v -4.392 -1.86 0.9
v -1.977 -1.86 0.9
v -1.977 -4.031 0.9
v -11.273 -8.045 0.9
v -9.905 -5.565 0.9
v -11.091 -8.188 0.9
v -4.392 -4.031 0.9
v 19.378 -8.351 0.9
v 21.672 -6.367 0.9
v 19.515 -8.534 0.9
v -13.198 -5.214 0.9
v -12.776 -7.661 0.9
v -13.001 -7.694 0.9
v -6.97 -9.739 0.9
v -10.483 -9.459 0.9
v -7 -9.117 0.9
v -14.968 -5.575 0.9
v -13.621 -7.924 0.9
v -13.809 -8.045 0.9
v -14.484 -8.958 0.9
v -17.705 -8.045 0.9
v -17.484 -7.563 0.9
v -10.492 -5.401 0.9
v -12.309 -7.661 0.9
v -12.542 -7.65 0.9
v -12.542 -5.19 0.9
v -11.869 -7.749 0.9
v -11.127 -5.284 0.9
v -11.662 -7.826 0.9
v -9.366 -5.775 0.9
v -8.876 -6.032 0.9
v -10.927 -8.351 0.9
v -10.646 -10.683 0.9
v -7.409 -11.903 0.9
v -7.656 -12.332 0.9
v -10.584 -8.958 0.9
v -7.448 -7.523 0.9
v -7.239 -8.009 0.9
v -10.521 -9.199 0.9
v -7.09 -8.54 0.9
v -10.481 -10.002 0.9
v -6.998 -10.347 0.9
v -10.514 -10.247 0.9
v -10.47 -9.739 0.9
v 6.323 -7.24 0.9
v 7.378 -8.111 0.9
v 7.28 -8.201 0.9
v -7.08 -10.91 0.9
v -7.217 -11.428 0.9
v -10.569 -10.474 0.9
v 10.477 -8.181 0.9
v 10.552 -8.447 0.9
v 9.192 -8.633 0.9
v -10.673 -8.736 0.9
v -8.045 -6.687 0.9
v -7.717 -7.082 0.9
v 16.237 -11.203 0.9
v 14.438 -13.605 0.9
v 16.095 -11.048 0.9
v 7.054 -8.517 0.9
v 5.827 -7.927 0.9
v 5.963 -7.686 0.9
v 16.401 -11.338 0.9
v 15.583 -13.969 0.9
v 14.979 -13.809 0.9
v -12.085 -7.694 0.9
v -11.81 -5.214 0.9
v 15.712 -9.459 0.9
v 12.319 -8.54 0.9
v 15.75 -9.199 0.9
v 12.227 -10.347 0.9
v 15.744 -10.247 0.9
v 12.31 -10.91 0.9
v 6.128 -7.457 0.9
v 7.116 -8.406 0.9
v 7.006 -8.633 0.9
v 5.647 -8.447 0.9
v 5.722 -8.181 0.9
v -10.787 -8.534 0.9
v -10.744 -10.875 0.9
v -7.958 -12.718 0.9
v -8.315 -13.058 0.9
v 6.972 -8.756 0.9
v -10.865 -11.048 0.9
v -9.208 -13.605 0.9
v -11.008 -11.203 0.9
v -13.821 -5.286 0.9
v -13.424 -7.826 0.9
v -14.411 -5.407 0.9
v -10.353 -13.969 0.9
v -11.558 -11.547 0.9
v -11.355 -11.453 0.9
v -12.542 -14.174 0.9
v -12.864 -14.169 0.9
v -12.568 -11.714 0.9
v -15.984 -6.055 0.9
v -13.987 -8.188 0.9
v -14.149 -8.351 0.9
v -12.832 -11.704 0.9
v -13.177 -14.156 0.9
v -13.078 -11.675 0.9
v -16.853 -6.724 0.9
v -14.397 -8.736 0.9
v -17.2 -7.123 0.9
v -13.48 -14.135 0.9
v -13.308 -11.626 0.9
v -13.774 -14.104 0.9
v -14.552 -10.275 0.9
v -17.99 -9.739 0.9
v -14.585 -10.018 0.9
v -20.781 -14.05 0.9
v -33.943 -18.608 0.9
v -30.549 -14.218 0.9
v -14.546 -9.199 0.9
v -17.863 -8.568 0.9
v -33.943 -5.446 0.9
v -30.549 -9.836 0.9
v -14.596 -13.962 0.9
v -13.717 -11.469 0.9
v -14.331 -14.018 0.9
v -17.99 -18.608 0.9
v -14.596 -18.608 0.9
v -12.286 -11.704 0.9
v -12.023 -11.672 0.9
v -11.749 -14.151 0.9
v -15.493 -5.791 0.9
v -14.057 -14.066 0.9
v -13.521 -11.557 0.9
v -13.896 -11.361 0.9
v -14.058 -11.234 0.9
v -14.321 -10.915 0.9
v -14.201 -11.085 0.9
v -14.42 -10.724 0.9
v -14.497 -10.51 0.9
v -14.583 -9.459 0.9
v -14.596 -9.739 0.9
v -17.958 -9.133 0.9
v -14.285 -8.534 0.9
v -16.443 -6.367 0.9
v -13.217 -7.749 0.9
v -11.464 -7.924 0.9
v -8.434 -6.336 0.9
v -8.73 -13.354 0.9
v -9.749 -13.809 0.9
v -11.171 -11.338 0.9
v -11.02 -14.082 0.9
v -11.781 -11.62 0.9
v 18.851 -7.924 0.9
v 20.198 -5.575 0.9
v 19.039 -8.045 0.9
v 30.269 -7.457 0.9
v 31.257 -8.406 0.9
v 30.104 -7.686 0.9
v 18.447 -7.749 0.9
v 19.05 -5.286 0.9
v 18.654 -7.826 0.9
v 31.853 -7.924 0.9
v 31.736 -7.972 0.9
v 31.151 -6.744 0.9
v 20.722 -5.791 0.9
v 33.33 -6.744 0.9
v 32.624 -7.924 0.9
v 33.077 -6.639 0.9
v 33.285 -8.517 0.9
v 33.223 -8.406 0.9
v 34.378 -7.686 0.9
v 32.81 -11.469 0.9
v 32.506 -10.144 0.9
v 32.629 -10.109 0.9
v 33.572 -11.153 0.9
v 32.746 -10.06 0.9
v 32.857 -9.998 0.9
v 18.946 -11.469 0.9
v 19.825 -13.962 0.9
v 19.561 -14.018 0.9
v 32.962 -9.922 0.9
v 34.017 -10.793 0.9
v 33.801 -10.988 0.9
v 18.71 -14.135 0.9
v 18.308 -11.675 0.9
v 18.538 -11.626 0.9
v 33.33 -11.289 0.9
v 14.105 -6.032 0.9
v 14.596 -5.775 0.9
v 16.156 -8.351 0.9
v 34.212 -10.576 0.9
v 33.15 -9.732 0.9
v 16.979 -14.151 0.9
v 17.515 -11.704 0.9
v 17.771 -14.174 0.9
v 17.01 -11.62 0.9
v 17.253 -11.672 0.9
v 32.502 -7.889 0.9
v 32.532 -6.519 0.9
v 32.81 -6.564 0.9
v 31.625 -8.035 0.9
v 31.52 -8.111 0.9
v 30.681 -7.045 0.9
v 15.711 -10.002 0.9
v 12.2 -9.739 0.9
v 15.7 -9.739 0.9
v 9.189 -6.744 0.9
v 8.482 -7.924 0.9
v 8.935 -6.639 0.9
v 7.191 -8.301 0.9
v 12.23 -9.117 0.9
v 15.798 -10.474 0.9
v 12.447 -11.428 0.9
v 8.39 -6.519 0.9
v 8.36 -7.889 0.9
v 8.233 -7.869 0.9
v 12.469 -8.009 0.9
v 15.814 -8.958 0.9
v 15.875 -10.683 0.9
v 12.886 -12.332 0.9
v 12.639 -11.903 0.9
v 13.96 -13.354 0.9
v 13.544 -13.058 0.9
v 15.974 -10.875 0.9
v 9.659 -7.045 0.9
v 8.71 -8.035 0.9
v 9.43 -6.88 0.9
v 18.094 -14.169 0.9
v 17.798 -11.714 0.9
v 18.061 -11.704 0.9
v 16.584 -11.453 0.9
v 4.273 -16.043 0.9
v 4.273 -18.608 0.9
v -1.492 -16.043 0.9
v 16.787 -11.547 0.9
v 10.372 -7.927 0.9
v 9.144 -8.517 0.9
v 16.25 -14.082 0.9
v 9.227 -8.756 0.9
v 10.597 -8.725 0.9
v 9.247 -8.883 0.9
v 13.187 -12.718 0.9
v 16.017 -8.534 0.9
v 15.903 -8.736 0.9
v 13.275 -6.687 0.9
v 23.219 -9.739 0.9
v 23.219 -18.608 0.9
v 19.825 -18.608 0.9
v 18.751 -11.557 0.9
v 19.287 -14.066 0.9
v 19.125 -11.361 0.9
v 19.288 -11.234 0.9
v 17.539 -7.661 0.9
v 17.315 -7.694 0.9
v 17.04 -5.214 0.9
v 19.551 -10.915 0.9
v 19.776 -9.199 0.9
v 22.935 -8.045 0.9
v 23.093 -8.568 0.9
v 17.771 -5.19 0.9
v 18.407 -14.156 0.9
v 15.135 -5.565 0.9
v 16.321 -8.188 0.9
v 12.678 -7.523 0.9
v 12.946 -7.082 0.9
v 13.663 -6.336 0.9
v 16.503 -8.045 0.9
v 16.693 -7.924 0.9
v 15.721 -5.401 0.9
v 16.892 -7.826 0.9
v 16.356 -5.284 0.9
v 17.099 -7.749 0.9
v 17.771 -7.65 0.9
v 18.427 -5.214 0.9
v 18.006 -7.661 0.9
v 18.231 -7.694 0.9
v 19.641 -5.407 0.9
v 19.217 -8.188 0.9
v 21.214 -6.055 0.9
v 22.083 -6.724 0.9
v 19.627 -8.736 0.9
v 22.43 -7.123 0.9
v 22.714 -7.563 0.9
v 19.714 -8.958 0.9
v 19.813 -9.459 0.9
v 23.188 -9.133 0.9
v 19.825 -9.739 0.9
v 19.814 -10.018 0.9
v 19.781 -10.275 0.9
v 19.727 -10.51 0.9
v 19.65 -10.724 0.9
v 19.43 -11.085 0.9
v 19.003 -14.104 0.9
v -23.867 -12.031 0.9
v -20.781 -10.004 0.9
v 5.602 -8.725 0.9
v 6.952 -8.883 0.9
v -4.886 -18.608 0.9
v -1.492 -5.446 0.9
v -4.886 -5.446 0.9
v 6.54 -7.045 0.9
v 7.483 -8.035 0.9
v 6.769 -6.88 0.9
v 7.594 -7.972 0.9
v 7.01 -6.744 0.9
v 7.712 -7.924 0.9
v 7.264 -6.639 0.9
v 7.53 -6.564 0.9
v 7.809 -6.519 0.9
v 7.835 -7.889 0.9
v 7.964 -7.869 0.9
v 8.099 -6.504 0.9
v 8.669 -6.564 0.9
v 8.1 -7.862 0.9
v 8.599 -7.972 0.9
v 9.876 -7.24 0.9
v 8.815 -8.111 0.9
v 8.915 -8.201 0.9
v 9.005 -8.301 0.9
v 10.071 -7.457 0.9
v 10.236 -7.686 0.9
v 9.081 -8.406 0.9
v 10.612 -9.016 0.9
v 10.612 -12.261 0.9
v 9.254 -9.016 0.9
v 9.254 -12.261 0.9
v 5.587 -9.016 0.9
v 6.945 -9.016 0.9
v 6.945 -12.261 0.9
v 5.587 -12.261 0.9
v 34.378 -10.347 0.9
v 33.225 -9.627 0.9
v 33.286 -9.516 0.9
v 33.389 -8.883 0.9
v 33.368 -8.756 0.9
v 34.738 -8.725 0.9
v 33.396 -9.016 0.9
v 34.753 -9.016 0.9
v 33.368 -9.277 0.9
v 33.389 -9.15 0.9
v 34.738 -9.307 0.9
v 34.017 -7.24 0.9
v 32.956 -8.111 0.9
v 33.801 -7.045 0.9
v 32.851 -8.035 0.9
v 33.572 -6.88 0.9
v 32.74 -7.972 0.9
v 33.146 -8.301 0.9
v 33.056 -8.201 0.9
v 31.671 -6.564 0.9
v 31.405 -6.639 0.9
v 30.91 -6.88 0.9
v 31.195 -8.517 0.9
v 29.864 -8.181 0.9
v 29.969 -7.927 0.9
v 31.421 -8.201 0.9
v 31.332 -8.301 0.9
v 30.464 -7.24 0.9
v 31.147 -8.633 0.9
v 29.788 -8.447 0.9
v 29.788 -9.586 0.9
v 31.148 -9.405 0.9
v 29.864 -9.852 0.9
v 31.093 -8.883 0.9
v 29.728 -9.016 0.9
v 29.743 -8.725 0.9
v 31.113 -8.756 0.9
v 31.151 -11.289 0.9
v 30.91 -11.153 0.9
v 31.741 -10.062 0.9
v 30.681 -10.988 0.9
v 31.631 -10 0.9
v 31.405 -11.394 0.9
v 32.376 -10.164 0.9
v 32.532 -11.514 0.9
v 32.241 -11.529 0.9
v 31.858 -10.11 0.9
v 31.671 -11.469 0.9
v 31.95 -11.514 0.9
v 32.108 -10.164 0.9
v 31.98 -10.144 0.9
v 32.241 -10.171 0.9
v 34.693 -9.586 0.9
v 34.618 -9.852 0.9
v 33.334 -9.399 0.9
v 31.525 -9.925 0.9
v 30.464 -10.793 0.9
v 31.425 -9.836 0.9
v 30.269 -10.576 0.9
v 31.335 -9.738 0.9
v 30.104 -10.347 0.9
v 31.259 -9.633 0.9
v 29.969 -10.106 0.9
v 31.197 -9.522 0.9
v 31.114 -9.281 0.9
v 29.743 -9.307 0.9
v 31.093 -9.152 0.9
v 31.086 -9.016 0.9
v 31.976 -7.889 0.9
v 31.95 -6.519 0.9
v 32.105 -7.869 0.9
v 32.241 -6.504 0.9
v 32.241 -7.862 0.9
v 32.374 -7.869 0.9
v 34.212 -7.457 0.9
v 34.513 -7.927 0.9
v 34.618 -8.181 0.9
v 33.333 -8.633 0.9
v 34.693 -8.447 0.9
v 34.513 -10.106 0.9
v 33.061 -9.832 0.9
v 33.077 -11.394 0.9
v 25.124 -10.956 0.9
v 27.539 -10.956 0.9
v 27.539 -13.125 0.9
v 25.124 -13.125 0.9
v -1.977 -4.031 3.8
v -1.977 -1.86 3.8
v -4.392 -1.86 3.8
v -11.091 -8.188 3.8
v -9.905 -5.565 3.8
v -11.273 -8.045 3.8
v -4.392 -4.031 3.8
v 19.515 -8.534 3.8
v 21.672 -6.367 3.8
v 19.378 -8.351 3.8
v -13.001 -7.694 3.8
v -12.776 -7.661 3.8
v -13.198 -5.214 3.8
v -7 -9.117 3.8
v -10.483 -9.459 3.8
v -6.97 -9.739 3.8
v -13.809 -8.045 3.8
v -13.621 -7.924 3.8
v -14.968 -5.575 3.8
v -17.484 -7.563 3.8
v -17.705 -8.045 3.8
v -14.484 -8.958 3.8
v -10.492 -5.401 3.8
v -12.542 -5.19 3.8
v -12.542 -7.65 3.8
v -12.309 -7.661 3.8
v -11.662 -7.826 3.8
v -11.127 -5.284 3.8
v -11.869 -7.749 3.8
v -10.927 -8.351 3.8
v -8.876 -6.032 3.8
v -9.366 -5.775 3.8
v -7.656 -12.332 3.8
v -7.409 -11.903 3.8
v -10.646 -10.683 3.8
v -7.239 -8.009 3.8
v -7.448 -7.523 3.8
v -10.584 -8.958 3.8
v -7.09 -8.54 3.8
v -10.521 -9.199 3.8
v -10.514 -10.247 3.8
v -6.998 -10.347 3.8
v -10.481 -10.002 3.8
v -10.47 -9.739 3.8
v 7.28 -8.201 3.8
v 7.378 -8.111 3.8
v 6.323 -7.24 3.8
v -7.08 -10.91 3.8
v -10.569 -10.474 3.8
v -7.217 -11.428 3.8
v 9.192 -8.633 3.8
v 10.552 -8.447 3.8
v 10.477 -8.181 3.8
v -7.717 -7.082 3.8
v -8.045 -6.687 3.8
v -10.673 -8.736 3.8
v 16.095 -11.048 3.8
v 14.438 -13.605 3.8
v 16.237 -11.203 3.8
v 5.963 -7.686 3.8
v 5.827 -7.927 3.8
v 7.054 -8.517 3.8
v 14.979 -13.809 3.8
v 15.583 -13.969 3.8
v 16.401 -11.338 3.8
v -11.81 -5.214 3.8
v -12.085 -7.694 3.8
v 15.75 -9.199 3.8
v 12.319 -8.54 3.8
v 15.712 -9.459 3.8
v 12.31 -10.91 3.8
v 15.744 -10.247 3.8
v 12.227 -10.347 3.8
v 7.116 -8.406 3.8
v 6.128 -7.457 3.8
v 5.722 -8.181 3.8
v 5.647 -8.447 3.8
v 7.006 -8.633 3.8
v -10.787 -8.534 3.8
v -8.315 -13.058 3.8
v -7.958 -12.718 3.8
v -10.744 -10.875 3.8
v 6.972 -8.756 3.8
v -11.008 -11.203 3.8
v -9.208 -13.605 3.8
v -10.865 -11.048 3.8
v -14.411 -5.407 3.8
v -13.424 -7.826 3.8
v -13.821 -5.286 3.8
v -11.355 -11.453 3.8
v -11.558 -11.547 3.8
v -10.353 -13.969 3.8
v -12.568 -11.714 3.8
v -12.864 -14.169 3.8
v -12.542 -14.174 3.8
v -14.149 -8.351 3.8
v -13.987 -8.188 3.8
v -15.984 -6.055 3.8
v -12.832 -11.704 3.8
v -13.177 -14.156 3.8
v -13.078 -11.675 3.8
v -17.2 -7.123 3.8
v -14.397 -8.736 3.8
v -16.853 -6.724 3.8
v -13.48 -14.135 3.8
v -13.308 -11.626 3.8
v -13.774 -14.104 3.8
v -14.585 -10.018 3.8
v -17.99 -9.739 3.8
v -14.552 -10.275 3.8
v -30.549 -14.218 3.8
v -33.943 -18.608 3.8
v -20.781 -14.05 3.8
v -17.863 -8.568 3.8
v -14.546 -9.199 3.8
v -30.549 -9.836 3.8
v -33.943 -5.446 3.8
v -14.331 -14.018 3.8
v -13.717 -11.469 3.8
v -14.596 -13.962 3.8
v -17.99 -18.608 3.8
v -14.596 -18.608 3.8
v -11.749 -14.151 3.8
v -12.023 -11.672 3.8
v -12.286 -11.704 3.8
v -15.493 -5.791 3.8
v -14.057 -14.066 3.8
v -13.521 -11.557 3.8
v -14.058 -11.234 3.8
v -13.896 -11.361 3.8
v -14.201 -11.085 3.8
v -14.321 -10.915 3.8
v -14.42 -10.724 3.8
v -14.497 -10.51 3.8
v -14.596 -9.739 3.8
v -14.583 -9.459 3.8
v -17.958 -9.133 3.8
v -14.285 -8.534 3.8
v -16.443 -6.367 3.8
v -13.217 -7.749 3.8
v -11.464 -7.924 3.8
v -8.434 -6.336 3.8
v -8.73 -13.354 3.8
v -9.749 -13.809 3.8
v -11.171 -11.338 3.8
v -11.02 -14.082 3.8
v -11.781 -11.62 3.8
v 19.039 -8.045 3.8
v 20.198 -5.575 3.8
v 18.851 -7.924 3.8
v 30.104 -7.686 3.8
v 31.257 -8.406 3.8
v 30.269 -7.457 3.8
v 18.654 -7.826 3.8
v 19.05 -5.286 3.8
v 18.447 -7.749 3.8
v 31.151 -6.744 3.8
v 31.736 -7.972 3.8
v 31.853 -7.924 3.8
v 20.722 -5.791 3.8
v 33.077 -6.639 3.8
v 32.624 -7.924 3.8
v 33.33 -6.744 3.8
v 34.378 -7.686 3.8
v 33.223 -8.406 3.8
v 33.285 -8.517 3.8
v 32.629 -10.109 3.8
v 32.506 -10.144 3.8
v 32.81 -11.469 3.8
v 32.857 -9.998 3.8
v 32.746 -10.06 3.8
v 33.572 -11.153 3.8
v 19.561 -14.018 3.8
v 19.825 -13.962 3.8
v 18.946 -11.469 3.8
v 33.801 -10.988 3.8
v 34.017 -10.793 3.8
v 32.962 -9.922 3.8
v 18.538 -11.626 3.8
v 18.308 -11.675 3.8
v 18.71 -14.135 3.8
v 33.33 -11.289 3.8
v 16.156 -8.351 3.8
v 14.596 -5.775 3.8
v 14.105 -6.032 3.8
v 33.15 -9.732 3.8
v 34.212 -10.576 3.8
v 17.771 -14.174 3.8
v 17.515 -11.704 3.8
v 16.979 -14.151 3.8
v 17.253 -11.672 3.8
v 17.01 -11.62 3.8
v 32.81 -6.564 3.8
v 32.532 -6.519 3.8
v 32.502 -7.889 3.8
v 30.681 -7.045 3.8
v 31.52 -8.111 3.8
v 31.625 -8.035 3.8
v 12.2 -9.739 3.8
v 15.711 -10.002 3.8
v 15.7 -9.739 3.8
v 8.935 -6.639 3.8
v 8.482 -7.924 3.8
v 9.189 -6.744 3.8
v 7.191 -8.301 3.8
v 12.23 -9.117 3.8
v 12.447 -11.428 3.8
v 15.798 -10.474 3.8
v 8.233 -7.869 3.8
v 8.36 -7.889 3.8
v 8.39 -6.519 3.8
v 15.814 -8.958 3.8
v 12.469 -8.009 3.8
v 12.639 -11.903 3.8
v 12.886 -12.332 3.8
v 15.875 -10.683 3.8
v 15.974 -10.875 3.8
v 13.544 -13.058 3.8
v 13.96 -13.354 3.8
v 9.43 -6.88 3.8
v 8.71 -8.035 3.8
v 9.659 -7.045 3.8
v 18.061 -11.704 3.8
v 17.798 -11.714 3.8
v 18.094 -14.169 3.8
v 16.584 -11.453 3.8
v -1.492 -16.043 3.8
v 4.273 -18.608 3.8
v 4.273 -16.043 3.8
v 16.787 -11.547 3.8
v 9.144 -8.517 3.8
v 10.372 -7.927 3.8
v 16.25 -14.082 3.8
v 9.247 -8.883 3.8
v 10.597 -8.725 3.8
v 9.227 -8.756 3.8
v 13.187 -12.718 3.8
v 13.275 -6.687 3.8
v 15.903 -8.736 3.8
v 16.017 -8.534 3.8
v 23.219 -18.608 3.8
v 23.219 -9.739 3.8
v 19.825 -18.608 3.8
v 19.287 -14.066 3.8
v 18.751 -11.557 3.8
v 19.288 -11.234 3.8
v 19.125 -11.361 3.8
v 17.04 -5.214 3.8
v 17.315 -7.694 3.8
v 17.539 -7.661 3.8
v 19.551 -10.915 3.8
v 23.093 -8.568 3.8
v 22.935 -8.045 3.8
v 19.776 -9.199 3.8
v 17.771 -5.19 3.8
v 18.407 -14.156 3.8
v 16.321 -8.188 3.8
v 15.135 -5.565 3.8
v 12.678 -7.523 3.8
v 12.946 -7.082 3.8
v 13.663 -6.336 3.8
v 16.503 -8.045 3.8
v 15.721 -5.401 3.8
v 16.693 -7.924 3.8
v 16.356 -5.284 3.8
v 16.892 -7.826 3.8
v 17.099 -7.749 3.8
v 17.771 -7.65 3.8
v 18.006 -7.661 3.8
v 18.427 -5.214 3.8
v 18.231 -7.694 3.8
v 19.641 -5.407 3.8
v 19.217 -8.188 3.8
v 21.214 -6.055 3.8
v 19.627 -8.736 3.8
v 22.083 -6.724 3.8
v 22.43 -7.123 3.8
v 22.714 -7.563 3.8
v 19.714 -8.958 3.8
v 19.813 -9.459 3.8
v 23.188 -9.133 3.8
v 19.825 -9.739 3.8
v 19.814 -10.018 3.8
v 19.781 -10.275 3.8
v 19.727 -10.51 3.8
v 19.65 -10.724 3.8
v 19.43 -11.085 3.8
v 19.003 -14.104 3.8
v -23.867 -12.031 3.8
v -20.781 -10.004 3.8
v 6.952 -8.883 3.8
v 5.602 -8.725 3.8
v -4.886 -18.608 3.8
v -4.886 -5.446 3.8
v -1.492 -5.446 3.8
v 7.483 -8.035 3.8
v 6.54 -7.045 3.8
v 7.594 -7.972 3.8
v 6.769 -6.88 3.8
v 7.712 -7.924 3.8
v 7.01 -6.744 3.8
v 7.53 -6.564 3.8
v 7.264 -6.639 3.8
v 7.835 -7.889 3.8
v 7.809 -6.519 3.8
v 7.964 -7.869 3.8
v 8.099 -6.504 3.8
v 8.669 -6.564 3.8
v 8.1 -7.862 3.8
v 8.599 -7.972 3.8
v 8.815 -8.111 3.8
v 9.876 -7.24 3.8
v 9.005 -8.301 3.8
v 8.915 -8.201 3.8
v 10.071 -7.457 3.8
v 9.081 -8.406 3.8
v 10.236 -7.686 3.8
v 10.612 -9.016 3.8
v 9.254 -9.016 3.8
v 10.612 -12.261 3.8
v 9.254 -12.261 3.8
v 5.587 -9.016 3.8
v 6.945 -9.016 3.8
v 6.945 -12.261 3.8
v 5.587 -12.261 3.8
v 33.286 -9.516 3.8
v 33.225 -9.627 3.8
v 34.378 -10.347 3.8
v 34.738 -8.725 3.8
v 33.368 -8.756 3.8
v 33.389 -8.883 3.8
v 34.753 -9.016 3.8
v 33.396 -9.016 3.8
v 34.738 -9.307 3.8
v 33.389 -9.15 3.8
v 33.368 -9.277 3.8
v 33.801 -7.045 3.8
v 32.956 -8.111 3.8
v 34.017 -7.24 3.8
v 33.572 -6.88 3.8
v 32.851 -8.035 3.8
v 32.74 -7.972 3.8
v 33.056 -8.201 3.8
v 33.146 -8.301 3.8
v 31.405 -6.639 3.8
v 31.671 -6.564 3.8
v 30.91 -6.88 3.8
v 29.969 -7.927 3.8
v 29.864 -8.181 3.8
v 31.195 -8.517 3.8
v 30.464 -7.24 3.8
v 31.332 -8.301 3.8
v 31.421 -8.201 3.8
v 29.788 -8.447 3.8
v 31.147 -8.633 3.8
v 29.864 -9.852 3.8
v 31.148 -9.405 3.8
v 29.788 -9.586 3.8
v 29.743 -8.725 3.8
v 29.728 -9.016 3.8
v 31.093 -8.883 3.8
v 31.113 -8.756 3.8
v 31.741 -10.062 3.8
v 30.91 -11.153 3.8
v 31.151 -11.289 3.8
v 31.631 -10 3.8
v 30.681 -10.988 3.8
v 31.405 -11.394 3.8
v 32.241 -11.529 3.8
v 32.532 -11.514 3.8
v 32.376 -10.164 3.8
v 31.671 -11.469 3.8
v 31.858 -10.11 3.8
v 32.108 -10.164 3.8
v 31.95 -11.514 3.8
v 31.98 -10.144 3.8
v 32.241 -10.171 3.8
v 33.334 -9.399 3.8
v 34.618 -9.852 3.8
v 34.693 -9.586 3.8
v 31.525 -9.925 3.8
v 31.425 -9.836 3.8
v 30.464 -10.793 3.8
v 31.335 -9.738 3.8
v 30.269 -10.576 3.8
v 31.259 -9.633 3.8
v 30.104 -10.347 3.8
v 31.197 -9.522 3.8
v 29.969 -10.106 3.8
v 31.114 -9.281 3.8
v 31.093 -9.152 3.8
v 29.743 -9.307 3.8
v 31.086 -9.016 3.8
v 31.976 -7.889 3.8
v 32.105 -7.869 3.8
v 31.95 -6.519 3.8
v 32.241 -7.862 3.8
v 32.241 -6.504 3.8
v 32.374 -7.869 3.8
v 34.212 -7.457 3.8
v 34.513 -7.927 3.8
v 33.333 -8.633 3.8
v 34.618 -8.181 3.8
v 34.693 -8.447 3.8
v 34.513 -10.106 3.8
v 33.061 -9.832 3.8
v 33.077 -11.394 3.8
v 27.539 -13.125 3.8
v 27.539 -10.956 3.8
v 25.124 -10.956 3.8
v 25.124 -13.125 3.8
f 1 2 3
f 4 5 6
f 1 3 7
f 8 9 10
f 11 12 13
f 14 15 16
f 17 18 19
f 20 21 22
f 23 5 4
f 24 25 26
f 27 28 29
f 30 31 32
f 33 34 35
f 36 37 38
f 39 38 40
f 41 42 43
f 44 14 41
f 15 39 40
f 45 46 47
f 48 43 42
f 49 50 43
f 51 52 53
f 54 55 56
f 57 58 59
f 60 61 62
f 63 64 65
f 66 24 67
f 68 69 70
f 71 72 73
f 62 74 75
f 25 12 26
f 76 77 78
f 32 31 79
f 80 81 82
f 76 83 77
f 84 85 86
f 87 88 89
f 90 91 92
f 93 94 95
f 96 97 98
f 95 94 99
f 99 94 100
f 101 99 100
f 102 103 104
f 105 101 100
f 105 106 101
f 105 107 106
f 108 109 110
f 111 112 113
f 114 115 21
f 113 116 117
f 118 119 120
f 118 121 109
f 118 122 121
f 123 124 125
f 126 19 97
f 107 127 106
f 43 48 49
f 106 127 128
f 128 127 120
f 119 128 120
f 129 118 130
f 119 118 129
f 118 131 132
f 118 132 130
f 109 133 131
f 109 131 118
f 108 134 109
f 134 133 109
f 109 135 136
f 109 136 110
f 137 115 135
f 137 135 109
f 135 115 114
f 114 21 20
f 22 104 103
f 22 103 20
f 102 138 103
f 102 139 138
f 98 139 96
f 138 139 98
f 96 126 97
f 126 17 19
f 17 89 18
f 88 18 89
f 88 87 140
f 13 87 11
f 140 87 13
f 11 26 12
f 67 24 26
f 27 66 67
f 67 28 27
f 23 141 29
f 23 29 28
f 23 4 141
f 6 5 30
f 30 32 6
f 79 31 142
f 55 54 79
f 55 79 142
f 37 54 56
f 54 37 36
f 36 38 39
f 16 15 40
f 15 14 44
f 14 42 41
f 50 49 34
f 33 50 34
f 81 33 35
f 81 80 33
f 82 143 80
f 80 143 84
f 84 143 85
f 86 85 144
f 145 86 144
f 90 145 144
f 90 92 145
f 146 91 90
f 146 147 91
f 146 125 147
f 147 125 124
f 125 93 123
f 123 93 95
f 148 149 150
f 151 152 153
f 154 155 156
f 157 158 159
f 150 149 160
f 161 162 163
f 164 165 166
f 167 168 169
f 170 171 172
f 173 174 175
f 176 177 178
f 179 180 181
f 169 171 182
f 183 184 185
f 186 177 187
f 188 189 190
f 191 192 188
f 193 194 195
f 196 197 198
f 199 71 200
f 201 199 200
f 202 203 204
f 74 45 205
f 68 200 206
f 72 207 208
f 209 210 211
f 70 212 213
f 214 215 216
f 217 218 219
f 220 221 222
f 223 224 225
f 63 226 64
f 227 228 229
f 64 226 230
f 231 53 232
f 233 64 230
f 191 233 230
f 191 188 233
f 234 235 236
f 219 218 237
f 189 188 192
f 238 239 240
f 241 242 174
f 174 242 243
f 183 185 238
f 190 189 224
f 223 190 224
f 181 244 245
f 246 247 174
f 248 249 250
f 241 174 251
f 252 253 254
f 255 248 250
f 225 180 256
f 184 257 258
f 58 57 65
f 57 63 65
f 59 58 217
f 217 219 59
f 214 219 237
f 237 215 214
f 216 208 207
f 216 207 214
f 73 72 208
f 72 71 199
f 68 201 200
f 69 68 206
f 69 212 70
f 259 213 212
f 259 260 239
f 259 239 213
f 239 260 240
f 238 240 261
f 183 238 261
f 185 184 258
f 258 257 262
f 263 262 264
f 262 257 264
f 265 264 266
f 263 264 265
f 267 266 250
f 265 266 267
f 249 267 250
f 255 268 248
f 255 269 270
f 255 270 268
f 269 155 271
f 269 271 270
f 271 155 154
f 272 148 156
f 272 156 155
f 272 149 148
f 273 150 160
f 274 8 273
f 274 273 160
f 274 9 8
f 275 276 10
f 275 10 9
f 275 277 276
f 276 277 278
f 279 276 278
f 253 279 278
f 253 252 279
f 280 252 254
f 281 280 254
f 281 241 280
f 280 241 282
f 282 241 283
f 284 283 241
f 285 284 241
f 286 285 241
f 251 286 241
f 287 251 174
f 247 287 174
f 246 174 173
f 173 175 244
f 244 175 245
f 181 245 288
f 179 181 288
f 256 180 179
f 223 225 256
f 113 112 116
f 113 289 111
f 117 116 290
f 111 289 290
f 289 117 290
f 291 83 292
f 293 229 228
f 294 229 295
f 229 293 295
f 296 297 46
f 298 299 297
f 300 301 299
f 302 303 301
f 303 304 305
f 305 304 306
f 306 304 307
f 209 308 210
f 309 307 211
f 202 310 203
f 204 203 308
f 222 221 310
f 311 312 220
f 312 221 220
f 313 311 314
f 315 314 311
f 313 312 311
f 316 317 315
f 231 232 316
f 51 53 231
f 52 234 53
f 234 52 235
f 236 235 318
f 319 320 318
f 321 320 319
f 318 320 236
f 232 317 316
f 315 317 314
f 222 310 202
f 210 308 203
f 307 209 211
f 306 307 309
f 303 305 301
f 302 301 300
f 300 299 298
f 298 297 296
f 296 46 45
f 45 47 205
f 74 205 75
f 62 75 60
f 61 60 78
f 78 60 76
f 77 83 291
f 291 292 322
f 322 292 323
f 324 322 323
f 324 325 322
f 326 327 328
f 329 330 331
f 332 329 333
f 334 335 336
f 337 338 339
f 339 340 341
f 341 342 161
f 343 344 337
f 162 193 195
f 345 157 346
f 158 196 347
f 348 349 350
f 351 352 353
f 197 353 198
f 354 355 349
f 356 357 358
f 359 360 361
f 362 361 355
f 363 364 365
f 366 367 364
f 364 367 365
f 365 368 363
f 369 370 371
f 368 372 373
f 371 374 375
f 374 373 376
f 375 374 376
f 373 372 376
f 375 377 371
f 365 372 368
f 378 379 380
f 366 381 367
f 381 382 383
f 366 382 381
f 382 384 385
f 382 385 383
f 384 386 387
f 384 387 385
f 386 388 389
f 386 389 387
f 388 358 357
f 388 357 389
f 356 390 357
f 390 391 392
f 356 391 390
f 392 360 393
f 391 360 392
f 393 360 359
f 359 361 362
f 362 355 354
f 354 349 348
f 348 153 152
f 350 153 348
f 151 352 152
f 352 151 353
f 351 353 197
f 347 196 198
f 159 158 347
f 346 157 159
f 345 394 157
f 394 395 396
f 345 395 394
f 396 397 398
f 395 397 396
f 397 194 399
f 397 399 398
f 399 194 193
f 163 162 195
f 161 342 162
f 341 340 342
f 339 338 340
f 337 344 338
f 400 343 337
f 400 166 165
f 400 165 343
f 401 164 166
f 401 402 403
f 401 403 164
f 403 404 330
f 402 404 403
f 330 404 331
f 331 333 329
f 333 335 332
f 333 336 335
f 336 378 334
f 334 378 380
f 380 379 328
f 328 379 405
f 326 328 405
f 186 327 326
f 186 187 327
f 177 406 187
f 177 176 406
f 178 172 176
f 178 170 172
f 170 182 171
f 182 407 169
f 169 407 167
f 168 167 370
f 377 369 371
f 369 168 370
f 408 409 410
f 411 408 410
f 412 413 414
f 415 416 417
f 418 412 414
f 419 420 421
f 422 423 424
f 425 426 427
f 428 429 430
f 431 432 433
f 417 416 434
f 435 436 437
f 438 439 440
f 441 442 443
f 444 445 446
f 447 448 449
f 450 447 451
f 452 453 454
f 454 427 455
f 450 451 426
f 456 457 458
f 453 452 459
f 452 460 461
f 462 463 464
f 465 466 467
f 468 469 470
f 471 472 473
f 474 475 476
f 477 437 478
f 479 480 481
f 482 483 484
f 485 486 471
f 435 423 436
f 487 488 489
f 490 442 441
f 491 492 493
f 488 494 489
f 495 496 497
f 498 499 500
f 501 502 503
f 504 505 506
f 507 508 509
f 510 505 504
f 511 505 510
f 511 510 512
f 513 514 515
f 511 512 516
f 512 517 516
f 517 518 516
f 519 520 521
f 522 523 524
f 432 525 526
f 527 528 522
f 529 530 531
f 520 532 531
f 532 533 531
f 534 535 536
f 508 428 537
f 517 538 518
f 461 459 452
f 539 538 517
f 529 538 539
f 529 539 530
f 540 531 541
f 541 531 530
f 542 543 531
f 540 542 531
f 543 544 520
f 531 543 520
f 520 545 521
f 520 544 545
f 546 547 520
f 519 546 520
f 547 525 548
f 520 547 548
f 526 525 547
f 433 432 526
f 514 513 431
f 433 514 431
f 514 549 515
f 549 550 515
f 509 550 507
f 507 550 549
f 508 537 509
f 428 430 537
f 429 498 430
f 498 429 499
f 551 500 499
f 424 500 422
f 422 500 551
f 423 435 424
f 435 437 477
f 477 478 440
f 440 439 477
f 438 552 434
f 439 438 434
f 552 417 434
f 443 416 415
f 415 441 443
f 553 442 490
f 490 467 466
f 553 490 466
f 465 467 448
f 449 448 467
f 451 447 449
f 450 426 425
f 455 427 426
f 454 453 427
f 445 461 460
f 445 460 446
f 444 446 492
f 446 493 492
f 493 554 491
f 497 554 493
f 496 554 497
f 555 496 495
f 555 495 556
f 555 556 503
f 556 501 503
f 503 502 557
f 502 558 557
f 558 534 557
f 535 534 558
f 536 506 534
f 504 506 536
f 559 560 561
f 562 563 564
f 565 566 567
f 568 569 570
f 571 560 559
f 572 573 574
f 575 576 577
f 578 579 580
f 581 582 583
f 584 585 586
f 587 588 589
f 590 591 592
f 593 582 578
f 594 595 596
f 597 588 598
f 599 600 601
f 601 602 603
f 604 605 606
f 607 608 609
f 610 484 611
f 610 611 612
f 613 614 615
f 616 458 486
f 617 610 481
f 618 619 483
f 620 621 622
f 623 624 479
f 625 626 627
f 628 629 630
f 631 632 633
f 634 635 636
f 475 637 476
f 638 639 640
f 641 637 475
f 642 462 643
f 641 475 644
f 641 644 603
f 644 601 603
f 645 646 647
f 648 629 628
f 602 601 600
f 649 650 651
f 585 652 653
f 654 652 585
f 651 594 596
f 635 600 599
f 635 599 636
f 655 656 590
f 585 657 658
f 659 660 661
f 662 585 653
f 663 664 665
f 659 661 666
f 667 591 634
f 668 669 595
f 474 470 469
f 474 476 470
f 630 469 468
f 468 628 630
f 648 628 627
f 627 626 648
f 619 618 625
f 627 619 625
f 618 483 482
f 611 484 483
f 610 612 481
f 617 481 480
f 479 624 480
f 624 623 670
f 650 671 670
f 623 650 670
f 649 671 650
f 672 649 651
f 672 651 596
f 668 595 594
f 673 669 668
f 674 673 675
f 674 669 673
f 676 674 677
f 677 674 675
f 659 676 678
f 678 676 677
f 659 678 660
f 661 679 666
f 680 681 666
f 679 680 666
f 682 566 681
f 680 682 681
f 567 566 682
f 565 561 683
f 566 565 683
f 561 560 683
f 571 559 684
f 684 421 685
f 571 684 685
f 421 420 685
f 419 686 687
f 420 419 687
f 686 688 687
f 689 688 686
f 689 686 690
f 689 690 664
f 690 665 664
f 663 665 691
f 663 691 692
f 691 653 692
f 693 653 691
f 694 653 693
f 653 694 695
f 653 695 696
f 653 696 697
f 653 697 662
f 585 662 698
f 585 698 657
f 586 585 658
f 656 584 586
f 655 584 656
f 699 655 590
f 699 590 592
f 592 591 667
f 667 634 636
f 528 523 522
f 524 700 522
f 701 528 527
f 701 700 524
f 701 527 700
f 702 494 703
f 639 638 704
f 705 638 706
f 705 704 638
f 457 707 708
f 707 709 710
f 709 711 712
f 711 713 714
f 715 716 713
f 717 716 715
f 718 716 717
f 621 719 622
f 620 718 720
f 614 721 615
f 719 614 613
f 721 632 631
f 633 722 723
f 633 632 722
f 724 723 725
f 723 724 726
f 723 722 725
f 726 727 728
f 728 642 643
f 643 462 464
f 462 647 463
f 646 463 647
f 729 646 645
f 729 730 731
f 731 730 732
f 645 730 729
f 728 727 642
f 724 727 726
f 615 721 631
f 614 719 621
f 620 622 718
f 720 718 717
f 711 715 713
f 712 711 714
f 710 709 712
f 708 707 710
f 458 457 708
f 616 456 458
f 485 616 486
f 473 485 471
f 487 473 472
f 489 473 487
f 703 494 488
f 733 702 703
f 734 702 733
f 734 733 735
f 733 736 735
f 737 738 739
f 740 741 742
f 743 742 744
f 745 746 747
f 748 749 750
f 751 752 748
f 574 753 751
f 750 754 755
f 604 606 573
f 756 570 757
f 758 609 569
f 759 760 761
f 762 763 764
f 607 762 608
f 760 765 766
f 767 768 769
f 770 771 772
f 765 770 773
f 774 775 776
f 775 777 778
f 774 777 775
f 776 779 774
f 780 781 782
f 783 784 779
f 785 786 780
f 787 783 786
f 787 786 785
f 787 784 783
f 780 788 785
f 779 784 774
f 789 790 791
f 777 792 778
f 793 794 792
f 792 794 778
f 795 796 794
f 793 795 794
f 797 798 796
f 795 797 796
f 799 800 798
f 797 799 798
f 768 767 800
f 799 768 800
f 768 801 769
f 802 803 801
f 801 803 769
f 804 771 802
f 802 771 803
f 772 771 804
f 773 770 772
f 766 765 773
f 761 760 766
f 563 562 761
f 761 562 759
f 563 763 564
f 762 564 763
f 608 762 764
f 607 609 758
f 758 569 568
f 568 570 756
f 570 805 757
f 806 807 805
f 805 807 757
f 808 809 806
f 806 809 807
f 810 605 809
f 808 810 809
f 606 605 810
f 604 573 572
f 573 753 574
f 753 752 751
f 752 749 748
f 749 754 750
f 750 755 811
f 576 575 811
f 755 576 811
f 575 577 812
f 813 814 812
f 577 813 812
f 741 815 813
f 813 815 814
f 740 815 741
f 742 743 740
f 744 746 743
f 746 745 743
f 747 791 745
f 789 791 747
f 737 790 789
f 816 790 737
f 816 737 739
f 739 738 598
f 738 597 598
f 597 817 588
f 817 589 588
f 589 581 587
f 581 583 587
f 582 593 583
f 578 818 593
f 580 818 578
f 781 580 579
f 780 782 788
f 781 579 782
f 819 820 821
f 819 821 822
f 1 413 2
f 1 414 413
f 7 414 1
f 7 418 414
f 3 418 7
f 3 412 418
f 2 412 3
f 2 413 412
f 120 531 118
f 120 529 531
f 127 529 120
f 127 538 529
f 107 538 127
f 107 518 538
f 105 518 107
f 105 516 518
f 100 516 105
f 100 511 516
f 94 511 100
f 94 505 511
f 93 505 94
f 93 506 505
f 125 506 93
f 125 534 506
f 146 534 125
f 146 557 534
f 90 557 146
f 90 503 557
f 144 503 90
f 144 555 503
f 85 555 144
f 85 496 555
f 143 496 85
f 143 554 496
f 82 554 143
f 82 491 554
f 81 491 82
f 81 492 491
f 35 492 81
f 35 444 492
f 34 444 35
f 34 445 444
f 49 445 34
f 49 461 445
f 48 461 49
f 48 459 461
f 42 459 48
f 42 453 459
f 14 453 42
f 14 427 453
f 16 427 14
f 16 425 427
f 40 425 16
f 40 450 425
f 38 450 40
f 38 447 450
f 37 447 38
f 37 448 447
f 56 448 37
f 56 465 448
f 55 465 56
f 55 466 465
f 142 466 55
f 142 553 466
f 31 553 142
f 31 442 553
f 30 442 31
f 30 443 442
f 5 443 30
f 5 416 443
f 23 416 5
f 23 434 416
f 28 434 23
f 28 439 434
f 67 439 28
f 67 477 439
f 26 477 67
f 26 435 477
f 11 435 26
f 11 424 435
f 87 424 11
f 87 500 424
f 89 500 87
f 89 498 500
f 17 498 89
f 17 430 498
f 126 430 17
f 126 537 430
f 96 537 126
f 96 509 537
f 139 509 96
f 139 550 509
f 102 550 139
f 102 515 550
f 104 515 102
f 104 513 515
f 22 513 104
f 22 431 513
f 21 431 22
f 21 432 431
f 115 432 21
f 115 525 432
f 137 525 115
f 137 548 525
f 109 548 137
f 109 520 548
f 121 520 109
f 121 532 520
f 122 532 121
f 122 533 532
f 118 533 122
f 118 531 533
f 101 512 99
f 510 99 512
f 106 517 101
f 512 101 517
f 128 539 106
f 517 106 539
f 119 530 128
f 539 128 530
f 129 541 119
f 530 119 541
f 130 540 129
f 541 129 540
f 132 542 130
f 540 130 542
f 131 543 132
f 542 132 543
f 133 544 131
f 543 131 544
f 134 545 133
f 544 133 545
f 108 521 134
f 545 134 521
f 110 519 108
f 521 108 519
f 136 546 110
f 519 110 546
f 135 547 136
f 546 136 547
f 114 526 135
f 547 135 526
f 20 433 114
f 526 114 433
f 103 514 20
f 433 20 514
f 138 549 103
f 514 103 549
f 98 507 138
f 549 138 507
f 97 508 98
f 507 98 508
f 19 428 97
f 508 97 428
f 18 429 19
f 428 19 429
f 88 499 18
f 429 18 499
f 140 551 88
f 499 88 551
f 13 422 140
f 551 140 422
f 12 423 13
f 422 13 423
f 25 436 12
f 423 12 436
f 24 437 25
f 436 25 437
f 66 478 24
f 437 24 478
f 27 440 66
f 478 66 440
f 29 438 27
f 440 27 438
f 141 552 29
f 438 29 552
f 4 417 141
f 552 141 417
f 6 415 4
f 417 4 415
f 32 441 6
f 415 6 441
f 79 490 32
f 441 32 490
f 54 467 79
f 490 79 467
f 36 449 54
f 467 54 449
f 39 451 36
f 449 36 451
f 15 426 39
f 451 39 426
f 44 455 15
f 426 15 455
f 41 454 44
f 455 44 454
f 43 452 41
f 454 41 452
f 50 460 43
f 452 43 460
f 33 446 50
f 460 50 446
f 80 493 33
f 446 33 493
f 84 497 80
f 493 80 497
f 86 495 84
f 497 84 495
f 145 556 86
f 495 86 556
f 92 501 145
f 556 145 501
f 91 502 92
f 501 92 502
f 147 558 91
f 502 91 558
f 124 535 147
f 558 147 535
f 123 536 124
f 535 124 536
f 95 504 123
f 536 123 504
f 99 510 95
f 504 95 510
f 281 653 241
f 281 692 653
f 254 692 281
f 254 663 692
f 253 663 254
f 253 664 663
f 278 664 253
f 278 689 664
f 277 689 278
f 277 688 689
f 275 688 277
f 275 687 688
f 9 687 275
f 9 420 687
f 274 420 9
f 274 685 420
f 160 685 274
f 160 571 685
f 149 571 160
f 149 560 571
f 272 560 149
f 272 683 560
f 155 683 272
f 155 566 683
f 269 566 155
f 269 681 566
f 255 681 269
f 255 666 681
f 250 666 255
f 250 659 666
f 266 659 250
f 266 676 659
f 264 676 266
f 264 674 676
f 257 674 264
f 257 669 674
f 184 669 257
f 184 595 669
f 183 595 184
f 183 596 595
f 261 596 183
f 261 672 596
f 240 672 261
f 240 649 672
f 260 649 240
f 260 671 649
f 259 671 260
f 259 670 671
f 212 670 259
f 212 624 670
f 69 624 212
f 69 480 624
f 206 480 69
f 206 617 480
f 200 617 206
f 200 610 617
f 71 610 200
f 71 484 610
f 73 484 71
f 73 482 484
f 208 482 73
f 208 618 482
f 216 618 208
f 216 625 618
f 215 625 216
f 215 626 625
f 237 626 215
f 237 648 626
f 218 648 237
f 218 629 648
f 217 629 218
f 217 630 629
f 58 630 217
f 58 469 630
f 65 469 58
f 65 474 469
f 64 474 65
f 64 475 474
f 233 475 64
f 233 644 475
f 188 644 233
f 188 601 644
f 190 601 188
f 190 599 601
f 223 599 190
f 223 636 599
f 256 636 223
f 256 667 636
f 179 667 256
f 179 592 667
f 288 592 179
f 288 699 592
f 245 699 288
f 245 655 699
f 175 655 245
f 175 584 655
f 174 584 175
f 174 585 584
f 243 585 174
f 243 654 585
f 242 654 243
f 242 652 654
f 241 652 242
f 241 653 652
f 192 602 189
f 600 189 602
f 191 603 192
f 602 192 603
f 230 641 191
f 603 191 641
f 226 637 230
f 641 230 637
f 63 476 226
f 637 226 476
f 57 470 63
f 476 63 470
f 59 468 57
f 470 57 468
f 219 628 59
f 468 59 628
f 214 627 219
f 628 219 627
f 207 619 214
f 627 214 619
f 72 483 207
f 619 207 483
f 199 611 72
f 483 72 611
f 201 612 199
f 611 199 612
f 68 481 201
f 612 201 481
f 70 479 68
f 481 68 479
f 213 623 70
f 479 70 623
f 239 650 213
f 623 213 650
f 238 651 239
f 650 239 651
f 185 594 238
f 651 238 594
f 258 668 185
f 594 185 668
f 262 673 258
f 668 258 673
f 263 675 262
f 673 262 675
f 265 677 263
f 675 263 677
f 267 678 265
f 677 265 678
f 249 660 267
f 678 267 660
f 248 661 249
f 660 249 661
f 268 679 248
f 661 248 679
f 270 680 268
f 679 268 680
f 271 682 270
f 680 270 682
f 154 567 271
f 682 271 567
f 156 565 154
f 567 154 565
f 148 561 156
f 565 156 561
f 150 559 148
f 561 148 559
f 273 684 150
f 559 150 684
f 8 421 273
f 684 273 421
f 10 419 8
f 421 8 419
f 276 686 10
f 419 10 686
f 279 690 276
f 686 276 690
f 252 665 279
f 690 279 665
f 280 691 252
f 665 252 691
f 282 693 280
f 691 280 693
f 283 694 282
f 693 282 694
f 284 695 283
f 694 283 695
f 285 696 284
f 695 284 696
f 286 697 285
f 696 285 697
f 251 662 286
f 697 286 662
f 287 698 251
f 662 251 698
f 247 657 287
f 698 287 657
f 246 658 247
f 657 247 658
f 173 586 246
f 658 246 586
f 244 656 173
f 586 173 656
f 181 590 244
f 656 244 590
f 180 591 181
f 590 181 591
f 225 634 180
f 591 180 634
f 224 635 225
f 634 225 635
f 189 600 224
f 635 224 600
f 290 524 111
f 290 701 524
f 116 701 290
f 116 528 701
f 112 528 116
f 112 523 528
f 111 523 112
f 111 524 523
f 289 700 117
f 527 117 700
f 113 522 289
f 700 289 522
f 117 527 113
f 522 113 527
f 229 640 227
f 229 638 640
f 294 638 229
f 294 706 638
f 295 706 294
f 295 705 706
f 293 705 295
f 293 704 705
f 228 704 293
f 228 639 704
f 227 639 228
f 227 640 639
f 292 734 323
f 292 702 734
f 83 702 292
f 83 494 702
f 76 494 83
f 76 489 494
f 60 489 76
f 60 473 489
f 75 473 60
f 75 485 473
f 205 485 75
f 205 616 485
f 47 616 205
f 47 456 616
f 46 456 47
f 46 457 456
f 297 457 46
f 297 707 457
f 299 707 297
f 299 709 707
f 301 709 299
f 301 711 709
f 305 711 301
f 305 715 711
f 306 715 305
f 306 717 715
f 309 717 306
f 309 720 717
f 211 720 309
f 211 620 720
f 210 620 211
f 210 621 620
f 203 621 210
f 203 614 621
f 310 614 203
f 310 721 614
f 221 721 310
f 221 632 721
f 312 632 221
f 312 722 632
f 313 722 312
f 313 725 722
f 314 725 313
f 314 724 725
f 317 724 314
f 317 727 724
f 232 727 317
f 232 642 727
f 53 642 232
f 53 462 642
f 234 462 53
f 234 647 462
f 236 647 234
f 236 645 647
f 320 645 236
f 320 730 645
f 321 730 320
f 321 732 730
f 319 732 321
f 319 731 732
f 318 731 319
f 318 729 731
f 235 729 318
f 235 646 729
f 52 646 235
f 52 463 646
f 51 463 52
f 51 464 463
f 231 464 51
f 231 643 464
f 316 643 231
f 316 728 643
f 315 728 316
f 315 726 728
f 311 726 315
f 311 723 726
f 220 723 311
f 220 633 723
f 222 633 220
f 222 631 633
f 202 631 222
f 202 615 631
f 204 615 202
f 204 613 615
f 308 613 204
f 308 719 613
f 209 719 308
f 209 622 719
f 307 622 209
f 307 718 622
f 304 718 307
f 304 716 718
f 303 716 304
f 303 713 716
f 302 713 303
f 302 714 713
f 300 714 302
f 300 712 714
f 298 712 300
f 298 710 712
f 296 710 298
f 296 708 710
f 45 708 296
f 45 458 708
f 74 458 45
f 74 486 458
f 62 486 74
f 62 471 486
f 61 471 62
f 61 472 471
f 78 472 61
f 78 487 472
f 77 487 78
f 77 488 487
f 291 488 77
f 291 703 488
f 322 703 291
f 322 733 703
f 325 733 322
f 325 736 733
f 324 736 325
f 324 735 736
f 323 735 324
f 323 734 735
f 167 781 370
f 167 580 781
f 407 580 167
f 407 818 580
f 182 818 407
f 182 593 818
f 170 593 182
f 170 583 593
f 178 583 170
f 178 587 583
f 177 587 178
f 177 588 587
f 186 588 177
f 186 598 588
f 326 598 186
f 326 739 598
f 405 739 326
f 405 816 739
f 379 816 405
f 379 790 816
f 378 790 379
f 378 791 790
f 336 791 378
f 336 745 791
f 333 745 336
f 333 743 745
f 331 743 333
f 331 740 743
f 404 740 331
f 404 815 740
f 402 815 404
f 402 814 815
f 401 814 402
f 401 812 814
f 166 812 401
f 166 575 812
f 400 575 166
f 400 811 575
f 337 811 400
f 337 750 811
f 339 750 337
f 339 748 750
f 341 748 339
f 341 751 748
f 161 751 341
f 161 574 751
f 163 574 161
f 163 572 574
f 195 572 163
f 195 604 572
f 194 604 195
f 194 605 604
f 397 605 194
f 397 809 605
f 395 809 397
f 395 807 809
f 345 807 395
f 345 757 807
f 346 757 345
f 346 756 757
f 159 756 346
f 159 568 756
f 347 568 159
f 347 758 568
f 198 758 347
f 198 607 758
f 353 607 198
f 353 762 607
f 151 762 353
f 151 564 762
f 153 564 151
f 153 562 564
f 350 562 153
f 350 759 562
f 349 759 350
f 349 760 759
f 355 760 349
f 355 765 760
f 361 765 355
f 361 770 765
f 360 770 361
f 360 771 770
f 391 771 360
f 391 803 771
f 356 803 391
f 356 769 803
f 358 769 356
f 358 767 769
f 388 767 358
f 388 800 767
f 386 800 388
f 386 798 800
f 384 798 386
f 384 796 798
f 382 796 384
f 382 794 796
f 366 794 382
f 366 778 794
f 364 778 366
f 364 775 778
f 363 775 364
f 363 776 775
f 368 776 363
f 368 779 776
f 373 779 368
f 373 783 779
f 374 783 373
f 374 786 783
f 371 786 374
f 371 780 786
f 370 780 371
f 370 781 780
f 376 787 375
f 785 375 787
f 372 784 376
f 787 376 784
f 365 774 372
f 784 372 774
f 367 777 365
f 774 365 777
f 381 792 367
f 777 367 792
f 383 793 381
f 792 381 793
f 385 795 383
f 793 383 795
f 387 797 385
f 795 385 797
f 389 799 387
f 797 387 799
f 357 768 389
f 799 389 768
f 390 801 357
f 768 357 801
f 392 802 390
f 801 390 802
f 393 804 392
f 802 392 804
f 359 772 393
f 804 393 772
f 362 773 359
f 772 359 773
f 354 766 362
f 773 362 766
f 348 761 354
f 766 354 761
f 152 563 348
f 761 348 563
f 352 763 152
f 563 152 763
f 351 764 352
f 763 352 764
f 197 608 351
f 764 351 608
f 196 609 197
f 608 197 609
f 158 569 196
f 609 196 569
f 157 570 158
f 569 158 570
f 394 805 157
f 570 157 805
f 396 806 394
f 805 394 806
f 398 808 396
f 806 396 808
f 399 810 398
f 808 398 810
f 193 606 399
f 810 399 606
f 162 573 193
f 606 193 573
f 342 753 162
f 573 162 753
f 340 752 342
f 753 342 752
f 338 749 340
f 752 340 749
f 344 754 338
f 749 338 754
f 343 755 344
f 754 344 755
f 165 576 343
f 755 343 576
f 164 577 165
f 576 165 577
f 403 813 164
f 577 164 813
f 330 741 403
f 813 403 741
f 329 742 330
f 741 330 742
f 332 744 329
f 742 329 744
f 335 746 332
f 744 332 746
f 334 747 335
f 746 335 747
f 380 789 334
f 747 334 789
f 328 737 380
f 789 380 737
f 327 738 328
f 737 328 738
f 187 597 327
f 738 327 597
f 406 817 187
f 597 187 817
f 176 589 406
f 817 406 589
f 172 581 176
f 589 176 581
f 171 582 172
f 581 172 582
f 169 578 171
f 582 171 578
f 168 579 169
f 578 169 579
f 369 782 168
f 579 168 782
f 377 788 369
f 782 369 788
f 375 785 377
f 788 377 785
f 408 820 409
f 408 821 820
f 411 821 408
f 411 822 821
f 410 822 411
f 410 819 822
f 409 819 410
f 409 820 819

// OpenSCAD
$fn = 48;
  // syllabics (overlaid on icon, tallest) — row 2
  translate([0, -10.430, 0.900]) linear_extrude(height=2.900) text("ᐅᑭᒫᐢᑵᐤ", size=13.000, halign="center", valign="center", font="Euphemia UCAS:style=Bold");
